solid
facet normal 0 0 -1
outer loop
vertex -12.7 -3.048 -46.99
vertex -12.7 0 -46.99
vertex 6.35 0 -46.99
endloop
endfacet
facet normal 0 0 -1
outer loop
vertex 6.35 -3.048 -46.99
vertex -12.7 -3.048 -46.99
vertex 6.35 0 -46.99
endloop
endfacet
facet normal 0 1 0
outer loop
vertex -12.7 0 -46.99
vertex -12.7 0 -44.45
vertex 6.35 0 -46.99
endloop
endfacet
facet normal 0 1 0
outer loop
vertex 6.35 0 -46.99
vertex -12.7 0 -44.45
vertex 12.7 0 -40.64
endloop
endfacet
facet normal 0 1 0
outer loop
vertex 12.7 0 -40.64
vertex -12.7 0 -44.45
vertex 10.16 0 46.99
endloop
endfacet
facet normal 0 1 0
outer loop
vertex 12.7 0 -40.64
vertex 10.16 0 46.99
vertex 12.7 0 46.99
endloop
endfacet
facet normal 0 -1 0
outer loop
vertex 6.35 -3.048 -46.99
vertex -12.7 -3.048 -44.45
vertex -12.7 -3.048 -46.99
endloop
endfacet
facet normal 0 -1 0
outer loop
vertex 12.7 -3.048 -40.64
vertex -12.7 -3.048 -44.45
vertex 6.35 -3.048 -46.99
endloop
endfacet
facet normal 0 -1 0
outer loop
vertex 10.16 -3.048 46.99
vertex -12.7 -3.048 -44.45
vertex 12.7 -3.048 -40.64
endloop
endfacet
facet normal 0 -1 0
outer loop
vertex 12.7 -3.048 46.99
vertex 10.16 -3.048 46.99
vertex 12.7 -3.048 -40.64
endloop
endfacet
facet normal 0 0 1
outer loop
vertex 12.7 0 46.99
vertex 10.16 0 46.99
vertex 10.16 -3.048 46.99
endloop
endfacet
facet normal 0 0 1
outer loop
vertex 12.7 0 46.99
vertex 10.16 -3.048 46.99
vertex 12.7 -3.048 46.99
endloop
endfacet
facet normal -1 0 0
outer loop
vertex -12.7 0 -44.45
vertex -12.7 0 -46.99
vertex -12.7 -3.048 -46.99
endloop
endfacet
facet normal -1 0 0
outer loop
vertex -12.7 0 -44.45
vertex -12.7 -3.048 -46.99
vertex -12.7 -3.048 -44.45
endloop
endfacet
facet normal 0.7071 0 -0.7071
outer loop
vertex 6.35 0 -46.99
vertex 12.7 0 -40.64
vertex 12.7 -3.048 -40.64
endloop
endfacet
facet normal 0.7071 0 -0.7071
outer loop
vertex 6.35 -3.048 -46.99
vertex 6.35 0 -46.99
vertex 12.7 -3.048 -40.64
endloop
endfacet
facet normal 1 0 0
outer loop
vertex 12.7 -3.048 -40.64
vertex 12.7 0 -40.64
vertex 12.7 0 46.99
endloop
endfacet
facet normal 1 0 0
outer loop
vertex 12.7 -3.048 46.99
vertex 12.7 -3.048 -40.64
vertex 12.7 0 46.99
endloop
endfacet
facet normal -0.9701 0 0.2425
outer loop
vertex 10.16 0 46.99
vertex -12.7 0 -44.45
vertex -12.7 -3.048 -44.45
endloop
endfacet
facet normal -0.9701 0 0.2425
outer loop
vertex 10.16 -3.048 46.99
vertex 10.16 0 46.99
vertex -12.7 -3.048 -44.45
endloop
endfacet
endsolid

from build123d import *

# Parameters (mm, degrees)
F0_W     = 25.4
F0_H     = 93.98
F1_DEPTH = 3.048
F2_SIZE2 = 91.44
F2_SIZE  = 22.86
F3_SIZE2 = 6.35
F3_SIZE  = 6.35


with BuildPart() as f1:
    # F0 (on Front) → F1 (new body)
    with BuildSketch(Plane.XZ):
        Rectangle(F0_W, F0_H)
    extrude(amount=F1_DEPTH)

    # F2
    f2_edges = [f1.edges().sort_by_distance(p)[0] for p in [
        (-12.7, -1.524, 46.99),
    ]]
    f2_side = f1.faces().sort_by_distance((0, -1.524, 46.99))[0]
    chamfer(f2_edges, length=F2_SIZE, length2=F2_SIZE2, reference=f2_side)

    # F3
    f3_edges = [f1.edges().sort_by_distance(p)[0] for p in [
        (12.7, -1.524, -46.99),
    ]]
    chamfer(f3_edges, length=F3_SIZE, length2=F3_SIZE2)


solid = f1.part
